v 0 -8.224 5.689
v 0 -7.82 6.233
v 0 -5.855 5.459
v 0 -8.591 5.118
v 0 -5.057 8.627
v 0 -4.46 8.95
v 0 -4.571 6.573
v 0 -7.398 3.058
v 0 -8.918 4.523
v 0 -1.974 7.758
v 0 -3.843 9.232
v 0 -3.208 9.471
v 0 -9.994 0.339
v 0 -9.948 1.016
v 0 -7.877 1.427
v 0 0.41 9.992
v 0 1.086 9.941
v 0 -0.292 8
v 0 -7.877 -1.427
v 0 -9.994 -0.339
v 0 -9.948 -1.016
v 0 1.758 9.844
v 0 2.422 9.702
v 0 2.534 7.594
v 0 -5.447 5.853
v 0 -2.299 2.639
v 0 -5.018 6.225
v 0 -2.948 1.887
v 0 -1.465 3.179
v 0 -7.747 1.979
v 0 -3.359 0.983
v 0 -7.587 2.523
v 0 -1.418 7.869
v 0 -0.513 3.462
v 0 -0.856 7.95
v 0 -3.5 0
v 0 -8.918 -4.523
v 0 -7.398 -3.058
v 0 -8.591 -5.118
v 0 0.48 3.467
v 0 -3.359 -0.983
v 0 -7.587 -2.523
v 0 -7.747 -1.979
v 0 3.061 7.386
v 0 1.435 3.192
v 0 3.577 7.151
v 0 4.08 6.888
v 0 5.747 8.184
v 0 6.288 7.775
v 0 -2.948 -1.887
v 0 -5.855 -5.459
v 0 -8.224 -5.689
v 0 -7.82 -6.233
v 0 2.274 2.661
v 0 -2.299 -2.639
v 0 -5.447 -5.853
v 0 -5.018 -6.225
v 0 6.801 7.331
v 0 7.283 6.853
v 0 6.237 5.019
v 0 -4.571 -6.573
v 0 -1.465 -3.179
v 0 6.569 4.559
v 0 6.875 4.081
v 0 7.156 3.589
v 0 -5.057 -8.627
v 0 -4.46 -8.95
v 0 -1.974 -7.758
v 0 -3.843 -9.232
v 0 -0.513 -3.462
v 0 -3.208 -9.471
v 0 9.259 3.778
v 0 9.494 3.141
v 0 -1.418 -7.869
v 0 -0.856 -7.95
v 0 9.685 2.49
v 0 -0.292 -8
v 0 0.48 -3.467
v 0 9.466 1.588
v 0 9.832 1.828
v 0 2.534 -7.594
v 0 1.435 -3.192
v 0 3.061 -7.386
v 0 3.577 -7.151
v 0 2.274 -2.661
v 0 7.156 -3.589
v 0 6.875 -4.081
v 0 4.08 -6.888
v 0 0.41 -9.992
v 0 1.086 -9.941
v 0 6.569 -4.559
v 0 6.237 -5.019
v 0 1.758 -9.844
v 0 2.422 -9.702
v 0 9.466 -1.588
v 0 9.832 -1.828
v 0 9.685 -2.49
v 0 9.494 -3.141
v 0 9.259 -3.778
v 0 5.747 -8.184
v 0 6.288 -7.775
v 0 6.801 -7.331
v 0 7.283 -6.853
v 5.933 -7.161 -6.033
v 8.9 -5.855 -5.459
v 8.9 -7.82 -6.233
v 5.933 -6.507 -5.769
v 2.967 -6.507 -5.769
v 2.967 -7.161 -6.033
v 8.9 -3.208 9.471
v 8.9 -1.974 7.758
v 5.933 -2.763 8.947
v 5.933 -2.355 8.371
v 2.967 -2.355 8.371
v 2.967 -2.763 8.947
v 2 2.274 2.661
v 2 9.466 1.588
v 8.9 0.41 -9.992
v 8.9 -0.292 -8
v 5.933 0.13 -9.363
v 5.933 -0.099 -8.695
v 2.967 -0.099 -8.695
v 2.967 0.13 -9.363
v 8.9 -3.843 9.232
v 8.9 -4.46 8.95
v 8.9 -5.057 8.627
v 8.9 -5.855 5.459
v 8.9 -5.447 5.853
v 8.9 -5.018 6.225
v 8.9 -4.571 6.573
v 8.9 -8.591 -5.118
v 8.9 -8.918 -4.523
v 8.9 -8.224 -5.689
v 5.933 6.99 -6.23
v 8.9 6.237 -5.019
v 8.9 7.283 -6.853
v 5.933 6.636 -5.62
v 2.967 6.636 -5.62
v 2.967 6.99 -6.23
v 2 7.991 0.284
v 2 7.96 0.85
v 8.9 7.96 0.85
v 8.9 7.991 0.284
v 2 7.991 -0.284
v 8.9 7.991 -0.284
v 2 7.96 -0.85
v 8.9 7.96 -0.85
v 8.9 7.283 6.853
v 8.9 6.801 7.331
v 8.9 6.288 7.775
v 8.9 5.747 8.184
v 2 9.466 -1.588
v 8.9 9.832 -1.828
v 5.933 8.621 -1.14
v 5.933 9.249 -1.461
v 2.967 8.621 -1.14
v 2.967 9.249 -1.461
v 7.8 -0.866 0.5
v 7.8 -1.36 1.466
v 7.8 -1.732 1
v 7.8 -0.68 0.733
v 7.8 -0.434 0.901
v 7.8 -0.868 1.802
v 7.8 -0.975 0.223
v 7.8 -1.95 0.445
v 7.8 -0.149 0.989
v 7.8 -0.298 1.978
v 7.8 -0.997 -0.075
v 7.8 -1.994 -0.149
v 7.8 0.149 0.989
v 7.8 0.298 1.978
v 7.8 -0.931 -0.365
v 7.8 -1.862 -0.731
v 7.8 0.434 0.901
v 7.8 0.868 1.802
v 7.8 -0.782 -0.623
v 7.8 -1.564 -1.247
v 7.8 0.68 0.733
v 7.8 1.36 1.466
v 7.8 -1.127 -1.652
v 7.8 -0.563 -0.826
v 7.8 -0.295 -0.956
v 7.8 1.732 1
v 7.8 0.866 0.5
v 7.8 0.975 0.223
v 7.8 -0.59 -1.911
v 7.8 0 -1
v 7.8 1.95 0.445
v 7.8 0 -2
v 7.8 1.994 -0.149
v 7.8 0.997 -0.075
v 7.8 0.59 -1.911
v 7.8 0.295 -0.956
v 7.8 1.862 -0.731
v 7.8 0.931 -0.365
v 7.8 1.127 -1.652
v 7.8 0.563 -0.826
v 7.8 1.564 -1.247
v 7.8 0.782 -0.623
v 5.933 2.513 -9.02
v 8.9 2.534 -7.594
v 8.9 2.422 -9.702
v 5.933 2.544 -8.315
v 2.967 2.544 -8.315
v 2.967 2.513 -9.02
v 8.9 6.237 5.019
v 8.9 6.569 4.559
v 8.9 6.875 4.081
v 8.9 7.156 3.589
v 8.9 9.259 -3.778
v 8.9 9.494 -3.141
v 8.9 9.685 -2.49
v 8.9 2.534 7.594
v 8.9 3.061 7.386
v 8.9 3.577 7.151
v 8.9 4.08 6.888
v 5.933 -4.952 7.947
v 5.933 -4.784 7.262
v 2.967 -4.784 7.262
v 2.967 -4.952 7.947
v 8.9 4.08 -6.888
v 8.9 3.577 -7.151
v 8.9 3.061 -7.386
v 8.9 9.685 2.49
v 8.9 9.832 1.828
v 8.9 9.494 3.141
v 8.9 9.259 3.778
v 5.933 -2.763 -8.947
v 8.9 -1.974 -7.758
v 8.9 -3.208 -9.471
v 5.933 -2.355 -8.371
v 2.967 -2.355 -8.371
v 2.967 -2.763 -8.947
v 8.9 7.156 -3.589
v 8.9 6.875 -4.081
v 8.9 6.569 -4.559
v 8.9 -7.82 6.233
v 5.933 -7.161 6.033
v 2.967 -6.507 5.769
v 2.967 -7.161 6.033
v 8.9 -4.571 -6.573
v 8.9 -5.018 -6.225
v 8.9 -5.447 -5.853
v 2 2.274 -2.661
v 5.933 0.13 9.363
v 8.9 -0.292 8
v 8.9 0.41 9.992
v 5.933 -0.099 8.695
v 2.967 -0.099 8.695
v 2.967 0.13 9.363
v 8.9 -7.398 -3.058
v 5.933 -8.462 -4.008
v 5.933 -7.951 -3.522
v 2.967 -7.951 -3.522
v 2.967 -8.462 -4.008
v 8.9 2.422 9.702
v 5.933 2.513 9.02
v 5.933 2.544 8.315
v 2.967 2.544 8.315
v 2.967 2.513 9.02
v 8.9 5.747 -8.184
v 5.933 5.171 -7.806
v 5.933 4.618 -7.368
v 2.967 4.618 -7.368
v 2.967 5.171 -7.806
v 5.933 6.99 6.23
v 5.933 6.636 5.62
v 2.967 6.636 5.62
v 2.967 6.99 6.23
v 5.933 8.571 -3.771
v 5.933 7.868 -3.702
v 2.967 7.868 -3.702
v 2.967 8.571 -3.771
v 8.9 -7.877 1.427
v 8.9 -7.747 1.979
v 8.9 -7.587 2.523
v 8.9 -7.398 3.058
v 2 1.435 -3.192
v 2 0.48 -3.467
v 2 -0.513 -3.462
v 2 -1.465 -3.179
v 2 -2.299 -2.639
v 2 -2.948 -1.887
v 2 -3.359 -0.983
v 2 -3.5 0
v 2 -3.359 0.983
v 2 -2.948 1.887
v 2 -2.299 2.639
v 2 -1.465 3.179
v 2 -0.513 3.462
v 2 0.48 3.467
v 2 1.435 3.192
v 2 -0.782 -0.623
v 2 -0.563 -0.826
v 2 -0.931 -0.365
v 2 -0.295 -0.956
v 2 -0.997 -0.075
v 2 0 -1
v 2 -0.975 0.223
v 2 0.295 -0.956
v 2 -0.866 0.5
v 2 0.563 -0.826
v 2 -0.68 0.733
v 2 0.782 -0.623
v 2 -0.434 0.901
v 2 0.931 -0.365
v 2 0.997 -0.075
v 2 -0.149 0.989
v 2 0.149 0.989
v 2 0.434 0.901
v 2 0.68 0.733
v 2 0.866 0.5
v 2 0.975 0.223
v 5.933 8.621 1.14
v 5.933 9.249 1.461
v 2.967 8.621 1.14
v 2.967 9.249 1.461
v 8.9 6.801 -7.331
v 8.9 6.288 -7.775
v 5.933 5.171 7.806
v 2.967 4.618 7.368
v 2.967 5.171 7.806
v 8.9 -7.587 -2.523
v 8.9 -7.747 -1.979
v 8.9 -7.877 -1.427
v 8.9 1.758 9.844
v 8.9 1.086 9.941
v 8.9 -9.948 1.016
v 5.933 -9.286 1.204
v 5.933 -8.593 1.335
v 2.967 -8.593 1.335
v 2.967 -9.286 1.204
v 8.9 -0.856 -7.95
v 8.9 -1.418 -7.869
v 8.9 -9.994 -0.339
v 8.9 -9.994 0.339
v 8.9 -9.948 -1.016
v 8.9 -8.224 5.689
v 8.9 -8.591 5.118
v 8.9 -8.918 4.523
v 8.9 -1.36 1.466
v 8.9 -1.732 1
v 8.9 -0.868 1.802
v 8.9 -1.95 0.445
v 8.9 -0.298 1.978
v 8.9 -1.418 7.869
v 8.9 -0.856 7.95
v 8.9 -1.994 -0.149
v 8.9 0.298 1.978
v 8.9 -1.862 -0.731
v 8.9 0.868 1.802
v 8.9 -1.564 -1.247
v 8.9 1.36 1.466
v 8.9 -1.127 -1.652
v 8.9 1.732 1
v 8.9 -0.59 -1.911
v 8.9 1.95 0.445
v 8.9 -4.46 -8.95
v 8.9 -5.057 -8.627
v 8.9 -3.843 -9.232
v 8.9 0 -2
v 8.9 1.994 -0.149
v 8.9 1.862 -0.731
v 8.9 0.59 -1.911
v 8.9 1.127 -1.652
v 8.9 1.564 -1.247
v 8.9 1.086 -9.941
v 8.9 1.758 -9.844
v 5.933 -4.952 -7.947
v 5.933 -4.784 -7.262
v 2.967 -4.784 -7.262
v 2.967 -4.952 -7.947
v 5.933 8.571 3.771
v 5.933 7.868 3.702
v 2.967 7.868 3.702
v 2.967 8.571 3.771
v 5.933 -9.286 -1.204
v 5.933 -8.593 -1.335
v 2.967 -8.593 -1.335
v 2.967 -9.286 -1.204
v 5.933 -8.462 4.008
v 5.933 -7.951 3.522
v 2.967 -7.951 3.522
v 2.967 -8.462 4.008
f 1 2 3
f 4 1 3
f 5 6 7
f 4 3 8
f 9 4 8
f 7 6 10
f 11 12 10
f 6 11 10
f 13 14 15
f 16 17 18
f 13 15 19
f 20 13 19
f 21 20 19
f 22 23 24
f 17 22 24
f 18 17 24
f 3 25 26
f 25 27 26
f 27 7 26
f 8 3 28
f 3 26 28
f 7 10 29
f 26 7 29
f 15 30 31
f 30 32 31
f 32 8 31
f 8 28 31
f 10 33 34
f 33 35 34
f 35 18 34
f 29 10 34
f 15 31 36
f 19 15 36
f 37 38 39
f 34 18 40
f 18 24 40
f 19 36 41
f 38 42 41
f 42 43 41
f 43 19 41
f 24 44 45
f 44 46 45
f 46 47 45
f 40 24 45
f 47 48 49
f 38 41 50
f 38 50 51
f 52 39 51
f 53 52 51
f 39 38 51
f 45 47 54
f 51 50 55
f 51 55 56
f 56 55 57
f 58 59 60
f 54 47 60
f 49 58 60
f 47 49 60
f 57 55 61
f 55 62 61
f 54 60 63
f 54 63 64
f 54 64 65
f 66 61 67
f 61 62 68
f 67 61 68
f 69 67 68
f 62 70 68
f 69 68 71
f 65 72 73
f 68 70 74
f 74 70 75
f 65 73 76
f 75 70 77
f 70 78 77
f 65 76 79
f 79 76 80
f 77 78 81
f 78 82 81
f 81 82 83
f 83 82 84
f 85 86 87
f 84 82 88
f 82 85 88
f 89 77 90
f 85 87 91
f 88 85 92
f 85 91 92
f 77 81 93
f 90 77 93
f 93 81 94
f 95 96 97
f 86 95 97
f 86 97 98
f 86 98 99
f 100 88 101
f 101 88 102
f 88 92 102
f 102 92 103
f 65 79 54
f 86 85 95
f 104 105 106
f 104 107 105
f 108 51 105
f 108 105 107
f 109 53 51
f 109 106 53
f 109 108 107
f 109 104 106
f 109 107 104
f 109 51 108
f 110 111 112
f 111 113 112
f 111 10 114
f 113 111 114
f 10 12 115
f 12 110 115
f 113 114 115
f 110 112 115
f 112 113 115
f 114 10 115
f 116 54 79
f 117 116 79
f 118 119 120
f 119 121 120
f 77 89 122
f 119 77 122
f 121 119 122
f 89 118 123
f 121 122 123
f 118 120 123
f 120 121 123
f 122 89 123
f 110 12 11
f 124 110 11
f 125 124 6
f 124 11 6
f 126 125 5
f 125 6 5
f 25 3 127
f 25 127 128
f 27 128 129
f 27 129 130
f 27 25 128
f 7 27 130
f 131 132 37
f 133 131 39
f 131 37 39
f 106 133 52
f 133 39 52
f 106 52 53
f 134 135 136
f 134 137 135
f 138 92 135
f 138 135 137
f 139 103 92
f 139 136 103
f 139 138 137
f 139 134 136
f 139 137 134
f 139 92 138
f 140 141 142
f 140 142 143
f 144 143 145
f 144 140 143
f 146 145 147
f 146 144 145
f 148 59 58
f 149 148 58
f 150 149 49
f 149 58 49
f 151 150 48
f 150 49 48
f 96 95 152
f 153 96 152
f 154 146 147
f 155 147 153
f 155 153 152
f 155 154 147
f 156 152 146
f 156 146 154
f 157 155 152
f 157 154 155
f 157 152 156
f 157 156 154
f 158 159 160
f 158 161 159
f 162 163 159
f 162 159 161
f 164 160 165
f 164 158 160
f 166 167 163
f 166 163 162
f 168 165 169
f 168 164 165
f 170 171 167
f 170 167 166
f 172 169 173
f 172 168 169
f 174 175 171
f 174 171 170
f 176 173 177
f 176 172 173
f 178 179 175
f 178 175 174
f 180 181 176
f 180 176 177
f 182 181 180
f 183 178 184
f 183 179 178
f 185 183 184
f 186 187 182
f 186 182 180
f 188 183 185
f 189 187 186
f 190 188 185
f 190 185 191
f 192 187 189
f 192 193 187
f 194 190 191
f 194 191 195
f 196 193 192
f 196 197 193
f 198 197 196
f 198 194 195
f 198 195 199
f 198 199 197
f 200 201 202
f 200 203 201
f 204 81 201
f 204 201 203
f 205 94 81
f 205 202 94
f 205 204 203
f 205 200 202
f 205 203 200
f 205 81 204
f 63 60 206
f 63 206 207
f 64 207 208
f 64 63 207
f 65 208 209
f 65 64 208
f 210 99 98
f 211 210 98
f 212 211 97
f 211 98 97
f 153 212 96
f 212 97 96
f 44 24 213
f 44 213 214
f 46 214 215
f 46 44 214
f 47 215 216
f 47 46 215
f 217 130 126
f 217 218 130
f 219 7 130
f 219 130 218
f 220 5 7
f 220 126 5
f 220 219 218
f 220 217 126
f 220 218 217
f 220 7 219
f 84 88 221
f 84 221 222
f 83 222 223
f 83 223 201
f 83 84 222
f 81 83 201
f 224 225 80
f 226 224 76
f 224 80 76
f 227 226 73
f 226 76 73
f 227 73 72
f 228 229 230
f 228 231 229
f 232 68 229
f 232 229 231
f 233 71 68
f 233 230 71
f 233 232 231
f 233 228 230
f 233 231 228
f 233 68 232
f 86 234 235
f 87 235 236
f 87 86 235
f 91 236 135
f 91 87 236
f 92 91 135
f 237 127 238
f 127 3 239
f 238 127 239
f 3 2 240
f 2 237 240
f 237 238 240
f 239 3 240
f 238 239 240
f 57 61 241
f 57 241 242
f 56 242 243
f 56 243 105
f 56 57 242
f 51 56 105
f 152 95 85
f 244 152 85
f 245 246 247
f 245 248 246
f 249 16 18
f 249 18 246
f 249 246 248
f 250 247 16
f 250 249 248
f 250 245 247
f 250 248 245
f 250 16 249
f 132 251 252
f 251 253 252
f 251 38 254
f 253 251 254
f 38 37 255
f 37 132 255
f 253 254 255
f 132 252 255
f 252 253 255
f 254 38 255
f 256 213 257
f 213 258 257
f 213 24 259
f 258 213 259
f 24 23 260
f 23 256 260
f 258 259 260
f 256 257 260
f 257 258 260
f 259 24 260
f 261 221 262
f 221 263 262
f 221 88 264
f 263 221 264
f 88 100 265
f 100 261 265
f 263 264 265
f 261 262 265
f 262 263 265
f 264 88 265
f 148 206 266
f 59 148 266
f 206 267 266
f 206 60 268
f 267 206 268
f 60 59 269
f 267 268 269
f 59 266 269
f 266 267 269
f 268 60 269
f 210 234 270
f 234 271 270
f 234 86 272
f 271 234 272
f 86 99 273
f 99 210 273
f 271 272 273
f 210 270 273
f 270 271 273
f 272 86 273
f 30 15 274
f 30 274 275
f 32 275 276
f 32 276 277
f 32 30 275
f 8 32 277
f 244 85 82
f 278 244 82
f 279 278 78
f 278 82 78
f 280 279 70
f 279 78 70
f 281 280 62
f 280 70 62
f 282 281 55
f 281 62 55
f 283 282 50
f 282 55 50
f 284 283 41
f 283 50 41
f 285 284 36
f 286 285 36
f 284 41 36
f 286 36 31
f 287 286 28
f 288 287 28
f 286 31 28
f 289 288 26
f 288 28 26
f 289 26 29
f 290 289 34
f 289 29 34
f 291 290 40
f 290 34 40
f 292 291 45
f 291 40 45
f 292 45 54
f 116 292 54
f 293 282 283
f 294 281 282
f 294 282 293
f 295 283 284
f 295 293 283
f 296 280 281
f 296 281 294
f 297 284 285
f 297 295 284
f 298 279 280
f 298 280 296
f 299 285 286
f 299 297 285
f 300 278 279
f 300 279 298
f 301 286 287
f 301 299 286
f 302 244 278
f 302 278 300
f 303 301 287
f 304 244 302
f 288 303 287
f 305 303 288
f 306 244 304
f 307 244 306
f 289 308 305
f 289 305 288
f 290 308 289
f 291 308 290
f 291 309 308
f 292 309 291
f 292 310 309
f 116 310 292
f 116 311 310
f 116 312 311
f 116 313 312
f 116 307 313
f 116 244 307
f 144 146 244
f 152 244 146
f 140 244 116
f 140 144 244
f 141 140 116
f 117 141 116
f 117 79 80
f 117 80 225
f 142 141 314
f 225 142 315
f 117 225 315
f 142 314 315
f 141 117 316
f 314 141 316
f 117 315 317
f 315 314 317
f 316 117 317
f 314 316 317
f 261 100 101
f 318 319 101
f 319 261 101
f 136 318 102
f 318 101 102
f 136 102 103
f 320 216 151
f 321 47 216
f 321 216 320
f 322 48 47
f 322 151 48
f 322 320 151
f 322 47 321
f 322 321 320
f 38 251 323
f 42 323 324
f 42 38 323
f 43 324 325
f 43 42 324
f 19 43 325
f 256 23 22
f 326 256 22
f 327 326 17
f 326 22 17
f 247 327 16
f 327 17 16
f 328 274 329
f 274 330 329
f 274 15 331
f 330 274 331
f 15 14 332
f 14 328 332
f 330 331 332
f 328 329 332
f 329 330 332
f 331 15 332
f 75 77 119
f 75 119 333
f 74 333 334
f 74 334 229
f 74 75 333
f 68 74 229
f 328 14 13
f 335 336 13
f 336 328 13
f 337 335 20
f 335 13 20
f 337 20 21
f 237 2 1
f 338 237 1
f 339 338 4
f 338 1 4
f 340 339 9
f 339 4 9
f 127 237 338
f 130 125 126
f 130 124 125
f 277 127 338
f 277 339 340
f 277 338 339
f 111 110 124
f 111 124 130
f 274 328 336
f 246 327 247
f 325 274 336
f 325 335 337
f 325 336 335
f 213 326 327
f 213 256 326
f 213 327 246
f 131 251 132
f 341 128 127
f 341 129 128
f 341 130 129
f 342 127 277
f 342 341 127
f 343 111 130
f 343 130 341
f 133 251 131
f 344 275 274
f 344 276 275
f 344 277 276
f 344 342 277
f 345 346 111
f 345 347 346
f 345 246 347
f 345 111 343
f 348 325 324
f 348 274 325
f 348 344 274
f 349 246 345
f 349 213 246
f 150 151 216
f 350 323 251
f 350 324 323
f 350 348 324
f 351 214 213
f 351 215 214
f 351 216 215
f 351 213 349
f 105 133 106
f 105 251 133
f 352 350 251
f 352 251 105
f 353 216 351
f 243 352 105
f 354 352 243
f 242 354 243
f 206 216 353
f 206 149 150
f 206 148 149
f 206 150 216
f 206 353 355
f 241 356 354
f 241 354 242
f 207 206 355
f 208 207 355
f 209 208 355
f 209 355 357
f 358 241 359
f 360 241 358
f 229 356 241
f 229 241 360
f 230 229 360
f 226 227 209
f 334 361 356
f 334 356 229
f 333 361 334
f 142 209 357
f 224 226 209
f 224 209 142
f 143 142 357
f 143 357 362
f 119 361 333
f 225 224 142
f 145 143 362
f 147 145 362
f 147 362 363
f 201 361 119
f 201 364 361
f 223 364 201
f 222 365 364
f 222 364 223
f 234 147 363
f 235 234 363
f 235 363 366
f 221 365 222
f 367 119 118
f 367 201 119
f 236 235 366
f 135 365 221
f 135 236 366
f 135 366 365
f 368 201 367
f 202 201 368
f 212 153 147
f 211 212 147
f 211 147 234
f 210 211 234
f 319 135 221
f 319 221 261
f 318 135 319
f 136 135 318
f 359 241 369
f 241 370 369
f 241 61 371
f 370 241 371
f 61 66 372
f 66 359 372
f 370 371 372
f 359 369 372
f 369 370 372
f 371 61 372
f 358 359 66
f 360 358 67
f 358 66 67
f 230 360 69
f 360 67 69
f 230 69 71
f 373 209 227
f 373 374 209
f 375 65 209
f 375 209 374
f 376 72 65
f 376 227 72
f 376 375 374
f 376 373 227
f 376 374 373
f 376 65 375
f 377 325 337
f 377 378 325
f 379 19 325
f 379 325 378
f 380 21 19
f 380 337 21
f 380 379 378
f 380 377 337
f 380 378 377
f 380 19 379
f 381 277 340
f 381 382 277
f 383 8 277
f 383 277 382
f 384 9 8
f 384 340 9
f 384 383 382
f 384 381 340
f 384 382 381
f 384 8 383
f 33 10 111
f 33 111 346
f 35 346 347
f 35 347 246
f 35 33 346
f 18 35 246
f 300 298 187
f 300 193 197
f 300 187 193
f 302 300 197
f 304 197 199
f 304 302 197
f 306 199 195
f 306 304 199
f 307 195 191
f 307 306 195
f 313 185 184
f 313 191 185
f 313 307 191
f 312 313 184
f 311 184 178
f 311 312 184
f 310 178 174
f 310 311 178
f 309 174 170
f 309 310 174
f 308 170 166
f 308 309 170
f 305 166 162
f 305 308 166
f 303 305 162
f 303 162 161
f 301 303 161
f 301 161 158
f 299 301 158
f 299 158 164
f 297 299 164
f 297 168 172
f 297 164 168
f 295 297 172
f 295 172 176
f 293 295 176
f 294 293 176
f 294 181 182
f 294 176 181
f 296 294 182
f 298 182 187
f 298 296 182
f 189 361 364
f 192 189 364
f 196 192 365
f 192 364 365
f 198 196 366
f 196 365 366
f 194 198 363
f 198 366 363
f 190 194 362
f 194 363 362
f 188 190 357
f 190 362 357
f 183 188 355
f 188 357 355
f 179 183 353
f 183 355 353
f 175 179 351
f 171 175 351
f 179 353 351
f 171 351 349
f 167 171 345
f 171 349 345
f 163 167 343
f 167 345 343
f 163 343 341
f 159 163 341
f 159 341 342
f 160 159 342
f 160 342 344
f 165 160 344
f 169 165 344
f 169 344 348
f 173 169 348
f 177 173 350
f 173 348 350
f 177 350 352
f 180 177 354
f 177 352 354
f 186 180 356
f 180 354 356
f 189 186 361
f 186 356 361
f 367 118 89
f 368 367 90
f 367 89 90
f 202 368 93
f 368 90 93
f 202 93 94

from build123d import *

# Parameters (mm, degrees)
SKETCH2_R           = 10
SKETCH2_R_2         = 1
BOSS_EXTRUDE2_DEPTH = 8.9
SKETCH6_W           = 1.518009011
SKETCH6_H           = 0.616954646
CUT_EXTRUDE4_DEPTH  = 10
CIRPATTERN2_COUNT   = 11
SKETCH9_R           = 1
CUT_EXTRUDE6_DEPTH  = 2
SKETCH7_R           = 2
SKETCH7_R_2         = 1
CUT_EXTRUDE5_DEPTH  = 1.1


with BuildPart() as part:
    # Sketch2 → Boss-Extrude2 (new body)
    with BuildSketch(Plane(origin=(0, 0, 0), x_dir=(0, 0, -1), z_dir=(1, 0, 0))):
        Circle(SKETCH2_R)
        Circle(SKETCH2_R_2, mode=Mode.SUBTRACT)
    extrude(amount=BOSS_EXTRUDE2_DEPTH)

    # Sketch6 → Cut-Extrude4 (cut)
    with BuildSketch(Plane(origin=(0, 0, 0), x_dir=(0, 0, -1), z_dir=(1, 0, 0))):
        with Locations((-0.000564754, 9.986199456)):
            Rectangle(SKETCH6_W, SKETCH6_H)
        with BuildLine():
            ThreePointArc((1.85, 9.863100717), (0, 9.999274253), (-1.85, 9.863100717))
            add(Edge.make_bspline(
                [(-0.85, 7.960375373), (-1.133345882, 8.645593633), (-1.446471715, 9.299894306), (-1.85, 9.863100717)],
                knots=[0.309355195, 0.309355195, 0.309355195, 0.309355195, 0.515063523, 0.515063523, 0.515063523, 0.515063523], degree=3))
            ThreePointArc((-0.85, 7.960375373), (0, 7.994414161), (0.85, 7.960375373))
            add(Edge.make_bspline(
                [(0.85, 7.960375373), (1.133345882, 8.645593633), (1.446471715, 9.299894306), (1.85, 9.863100717)],
                knots=[0.309355195, 0.309355195, 0.309355195, 0.309355195, 0.515063523, 0.515063523, 0.515063523, 0.515063523], degree=3))
        make_face()
    cut_extrude4 = extrude(amount=CUT_EXTRUDE4_DEPTH, mode=Mode.SUBTRACT)

    # CirPattern2: Cut-Extrude4 ×11 about axis
    cirpattern2_axis = Axis((8.9, 0, 0), (-1, 0, 0))
    for i in range(1, CIRPATTERN2_COUNT):
        add(cut_extrude4.rotate(cirpattern2_axis, i * 360 / CIRPATTERN2_COUNT), mode=Mode.SUBTRACT)

    # Sketch9 → Cut-Extrude6 (cut)
    with BuildSketch(Plane.ZY):
        with BuildLine():
            add(Edge.make_bspline(
                [(-0.85, 7.960375373), (-1.068952888, 8.489871392), (-1.305688222, 9.000905649), (-1.588178753, 9.465711111)],
                knots=[0.309355195, 0.309355195, 0.309355195, 0.309355195, 0.468314387, 0.468314387, 0.468314387, 0.468314387], degree=3))
            Line((-1.588178753, 9.465711111), (-2.660873875, 2.273708474))
            ThreePointArc((-2.660873875, 2.273708474), (0, -3.5), (2.660873875, 2.273708474))
            Line((2.660873875, 2.273708474), (1.588178753, 9.465711111))
            add(Edge.make_bspline(
                [(0.85, 7.960375373), (1.068952888, 8.489871392), (1.305688222, 9.000905649), (1.588178753, 9.465711111)],
                knots=[0.309355195, 0.309355195, 0.309355195, 0.309355195, 0.468314387, 0.468314387, 0.468314387, 0.468314387], degree=3))
            ThreePointArc((0.85, 7.960375373), (0, 7.994414161), (-0.85, 7.960375373))
        make_face()
        Circle(SKETCH9_R, mode=Mode.SUBTRACT)
    extrude(amount=-CUT_EXTRUDE6_DEPTH, mode=Mode.SUBTRACT)

    # Sketch7 → Cut-Extrude5 (cut)
    with BuildSketch(Plane(origin=(8.9, 0, 0), x_dir=(0, 0, -1), z_dir=(1, 0, 0))):
        Circle(SKETCH7_R)
        with Locations(Location((0, 0, 0), (0, 0, 180))):  # turned: the seam where the file's is
            Circle(SKETCH7_R_2, mode=Mode.SUBTRACT)
    extrude(amount=-CUT_EXTRUDE5_DEPTH, mode=Mode.SUBTRACT)


solid = part.part
